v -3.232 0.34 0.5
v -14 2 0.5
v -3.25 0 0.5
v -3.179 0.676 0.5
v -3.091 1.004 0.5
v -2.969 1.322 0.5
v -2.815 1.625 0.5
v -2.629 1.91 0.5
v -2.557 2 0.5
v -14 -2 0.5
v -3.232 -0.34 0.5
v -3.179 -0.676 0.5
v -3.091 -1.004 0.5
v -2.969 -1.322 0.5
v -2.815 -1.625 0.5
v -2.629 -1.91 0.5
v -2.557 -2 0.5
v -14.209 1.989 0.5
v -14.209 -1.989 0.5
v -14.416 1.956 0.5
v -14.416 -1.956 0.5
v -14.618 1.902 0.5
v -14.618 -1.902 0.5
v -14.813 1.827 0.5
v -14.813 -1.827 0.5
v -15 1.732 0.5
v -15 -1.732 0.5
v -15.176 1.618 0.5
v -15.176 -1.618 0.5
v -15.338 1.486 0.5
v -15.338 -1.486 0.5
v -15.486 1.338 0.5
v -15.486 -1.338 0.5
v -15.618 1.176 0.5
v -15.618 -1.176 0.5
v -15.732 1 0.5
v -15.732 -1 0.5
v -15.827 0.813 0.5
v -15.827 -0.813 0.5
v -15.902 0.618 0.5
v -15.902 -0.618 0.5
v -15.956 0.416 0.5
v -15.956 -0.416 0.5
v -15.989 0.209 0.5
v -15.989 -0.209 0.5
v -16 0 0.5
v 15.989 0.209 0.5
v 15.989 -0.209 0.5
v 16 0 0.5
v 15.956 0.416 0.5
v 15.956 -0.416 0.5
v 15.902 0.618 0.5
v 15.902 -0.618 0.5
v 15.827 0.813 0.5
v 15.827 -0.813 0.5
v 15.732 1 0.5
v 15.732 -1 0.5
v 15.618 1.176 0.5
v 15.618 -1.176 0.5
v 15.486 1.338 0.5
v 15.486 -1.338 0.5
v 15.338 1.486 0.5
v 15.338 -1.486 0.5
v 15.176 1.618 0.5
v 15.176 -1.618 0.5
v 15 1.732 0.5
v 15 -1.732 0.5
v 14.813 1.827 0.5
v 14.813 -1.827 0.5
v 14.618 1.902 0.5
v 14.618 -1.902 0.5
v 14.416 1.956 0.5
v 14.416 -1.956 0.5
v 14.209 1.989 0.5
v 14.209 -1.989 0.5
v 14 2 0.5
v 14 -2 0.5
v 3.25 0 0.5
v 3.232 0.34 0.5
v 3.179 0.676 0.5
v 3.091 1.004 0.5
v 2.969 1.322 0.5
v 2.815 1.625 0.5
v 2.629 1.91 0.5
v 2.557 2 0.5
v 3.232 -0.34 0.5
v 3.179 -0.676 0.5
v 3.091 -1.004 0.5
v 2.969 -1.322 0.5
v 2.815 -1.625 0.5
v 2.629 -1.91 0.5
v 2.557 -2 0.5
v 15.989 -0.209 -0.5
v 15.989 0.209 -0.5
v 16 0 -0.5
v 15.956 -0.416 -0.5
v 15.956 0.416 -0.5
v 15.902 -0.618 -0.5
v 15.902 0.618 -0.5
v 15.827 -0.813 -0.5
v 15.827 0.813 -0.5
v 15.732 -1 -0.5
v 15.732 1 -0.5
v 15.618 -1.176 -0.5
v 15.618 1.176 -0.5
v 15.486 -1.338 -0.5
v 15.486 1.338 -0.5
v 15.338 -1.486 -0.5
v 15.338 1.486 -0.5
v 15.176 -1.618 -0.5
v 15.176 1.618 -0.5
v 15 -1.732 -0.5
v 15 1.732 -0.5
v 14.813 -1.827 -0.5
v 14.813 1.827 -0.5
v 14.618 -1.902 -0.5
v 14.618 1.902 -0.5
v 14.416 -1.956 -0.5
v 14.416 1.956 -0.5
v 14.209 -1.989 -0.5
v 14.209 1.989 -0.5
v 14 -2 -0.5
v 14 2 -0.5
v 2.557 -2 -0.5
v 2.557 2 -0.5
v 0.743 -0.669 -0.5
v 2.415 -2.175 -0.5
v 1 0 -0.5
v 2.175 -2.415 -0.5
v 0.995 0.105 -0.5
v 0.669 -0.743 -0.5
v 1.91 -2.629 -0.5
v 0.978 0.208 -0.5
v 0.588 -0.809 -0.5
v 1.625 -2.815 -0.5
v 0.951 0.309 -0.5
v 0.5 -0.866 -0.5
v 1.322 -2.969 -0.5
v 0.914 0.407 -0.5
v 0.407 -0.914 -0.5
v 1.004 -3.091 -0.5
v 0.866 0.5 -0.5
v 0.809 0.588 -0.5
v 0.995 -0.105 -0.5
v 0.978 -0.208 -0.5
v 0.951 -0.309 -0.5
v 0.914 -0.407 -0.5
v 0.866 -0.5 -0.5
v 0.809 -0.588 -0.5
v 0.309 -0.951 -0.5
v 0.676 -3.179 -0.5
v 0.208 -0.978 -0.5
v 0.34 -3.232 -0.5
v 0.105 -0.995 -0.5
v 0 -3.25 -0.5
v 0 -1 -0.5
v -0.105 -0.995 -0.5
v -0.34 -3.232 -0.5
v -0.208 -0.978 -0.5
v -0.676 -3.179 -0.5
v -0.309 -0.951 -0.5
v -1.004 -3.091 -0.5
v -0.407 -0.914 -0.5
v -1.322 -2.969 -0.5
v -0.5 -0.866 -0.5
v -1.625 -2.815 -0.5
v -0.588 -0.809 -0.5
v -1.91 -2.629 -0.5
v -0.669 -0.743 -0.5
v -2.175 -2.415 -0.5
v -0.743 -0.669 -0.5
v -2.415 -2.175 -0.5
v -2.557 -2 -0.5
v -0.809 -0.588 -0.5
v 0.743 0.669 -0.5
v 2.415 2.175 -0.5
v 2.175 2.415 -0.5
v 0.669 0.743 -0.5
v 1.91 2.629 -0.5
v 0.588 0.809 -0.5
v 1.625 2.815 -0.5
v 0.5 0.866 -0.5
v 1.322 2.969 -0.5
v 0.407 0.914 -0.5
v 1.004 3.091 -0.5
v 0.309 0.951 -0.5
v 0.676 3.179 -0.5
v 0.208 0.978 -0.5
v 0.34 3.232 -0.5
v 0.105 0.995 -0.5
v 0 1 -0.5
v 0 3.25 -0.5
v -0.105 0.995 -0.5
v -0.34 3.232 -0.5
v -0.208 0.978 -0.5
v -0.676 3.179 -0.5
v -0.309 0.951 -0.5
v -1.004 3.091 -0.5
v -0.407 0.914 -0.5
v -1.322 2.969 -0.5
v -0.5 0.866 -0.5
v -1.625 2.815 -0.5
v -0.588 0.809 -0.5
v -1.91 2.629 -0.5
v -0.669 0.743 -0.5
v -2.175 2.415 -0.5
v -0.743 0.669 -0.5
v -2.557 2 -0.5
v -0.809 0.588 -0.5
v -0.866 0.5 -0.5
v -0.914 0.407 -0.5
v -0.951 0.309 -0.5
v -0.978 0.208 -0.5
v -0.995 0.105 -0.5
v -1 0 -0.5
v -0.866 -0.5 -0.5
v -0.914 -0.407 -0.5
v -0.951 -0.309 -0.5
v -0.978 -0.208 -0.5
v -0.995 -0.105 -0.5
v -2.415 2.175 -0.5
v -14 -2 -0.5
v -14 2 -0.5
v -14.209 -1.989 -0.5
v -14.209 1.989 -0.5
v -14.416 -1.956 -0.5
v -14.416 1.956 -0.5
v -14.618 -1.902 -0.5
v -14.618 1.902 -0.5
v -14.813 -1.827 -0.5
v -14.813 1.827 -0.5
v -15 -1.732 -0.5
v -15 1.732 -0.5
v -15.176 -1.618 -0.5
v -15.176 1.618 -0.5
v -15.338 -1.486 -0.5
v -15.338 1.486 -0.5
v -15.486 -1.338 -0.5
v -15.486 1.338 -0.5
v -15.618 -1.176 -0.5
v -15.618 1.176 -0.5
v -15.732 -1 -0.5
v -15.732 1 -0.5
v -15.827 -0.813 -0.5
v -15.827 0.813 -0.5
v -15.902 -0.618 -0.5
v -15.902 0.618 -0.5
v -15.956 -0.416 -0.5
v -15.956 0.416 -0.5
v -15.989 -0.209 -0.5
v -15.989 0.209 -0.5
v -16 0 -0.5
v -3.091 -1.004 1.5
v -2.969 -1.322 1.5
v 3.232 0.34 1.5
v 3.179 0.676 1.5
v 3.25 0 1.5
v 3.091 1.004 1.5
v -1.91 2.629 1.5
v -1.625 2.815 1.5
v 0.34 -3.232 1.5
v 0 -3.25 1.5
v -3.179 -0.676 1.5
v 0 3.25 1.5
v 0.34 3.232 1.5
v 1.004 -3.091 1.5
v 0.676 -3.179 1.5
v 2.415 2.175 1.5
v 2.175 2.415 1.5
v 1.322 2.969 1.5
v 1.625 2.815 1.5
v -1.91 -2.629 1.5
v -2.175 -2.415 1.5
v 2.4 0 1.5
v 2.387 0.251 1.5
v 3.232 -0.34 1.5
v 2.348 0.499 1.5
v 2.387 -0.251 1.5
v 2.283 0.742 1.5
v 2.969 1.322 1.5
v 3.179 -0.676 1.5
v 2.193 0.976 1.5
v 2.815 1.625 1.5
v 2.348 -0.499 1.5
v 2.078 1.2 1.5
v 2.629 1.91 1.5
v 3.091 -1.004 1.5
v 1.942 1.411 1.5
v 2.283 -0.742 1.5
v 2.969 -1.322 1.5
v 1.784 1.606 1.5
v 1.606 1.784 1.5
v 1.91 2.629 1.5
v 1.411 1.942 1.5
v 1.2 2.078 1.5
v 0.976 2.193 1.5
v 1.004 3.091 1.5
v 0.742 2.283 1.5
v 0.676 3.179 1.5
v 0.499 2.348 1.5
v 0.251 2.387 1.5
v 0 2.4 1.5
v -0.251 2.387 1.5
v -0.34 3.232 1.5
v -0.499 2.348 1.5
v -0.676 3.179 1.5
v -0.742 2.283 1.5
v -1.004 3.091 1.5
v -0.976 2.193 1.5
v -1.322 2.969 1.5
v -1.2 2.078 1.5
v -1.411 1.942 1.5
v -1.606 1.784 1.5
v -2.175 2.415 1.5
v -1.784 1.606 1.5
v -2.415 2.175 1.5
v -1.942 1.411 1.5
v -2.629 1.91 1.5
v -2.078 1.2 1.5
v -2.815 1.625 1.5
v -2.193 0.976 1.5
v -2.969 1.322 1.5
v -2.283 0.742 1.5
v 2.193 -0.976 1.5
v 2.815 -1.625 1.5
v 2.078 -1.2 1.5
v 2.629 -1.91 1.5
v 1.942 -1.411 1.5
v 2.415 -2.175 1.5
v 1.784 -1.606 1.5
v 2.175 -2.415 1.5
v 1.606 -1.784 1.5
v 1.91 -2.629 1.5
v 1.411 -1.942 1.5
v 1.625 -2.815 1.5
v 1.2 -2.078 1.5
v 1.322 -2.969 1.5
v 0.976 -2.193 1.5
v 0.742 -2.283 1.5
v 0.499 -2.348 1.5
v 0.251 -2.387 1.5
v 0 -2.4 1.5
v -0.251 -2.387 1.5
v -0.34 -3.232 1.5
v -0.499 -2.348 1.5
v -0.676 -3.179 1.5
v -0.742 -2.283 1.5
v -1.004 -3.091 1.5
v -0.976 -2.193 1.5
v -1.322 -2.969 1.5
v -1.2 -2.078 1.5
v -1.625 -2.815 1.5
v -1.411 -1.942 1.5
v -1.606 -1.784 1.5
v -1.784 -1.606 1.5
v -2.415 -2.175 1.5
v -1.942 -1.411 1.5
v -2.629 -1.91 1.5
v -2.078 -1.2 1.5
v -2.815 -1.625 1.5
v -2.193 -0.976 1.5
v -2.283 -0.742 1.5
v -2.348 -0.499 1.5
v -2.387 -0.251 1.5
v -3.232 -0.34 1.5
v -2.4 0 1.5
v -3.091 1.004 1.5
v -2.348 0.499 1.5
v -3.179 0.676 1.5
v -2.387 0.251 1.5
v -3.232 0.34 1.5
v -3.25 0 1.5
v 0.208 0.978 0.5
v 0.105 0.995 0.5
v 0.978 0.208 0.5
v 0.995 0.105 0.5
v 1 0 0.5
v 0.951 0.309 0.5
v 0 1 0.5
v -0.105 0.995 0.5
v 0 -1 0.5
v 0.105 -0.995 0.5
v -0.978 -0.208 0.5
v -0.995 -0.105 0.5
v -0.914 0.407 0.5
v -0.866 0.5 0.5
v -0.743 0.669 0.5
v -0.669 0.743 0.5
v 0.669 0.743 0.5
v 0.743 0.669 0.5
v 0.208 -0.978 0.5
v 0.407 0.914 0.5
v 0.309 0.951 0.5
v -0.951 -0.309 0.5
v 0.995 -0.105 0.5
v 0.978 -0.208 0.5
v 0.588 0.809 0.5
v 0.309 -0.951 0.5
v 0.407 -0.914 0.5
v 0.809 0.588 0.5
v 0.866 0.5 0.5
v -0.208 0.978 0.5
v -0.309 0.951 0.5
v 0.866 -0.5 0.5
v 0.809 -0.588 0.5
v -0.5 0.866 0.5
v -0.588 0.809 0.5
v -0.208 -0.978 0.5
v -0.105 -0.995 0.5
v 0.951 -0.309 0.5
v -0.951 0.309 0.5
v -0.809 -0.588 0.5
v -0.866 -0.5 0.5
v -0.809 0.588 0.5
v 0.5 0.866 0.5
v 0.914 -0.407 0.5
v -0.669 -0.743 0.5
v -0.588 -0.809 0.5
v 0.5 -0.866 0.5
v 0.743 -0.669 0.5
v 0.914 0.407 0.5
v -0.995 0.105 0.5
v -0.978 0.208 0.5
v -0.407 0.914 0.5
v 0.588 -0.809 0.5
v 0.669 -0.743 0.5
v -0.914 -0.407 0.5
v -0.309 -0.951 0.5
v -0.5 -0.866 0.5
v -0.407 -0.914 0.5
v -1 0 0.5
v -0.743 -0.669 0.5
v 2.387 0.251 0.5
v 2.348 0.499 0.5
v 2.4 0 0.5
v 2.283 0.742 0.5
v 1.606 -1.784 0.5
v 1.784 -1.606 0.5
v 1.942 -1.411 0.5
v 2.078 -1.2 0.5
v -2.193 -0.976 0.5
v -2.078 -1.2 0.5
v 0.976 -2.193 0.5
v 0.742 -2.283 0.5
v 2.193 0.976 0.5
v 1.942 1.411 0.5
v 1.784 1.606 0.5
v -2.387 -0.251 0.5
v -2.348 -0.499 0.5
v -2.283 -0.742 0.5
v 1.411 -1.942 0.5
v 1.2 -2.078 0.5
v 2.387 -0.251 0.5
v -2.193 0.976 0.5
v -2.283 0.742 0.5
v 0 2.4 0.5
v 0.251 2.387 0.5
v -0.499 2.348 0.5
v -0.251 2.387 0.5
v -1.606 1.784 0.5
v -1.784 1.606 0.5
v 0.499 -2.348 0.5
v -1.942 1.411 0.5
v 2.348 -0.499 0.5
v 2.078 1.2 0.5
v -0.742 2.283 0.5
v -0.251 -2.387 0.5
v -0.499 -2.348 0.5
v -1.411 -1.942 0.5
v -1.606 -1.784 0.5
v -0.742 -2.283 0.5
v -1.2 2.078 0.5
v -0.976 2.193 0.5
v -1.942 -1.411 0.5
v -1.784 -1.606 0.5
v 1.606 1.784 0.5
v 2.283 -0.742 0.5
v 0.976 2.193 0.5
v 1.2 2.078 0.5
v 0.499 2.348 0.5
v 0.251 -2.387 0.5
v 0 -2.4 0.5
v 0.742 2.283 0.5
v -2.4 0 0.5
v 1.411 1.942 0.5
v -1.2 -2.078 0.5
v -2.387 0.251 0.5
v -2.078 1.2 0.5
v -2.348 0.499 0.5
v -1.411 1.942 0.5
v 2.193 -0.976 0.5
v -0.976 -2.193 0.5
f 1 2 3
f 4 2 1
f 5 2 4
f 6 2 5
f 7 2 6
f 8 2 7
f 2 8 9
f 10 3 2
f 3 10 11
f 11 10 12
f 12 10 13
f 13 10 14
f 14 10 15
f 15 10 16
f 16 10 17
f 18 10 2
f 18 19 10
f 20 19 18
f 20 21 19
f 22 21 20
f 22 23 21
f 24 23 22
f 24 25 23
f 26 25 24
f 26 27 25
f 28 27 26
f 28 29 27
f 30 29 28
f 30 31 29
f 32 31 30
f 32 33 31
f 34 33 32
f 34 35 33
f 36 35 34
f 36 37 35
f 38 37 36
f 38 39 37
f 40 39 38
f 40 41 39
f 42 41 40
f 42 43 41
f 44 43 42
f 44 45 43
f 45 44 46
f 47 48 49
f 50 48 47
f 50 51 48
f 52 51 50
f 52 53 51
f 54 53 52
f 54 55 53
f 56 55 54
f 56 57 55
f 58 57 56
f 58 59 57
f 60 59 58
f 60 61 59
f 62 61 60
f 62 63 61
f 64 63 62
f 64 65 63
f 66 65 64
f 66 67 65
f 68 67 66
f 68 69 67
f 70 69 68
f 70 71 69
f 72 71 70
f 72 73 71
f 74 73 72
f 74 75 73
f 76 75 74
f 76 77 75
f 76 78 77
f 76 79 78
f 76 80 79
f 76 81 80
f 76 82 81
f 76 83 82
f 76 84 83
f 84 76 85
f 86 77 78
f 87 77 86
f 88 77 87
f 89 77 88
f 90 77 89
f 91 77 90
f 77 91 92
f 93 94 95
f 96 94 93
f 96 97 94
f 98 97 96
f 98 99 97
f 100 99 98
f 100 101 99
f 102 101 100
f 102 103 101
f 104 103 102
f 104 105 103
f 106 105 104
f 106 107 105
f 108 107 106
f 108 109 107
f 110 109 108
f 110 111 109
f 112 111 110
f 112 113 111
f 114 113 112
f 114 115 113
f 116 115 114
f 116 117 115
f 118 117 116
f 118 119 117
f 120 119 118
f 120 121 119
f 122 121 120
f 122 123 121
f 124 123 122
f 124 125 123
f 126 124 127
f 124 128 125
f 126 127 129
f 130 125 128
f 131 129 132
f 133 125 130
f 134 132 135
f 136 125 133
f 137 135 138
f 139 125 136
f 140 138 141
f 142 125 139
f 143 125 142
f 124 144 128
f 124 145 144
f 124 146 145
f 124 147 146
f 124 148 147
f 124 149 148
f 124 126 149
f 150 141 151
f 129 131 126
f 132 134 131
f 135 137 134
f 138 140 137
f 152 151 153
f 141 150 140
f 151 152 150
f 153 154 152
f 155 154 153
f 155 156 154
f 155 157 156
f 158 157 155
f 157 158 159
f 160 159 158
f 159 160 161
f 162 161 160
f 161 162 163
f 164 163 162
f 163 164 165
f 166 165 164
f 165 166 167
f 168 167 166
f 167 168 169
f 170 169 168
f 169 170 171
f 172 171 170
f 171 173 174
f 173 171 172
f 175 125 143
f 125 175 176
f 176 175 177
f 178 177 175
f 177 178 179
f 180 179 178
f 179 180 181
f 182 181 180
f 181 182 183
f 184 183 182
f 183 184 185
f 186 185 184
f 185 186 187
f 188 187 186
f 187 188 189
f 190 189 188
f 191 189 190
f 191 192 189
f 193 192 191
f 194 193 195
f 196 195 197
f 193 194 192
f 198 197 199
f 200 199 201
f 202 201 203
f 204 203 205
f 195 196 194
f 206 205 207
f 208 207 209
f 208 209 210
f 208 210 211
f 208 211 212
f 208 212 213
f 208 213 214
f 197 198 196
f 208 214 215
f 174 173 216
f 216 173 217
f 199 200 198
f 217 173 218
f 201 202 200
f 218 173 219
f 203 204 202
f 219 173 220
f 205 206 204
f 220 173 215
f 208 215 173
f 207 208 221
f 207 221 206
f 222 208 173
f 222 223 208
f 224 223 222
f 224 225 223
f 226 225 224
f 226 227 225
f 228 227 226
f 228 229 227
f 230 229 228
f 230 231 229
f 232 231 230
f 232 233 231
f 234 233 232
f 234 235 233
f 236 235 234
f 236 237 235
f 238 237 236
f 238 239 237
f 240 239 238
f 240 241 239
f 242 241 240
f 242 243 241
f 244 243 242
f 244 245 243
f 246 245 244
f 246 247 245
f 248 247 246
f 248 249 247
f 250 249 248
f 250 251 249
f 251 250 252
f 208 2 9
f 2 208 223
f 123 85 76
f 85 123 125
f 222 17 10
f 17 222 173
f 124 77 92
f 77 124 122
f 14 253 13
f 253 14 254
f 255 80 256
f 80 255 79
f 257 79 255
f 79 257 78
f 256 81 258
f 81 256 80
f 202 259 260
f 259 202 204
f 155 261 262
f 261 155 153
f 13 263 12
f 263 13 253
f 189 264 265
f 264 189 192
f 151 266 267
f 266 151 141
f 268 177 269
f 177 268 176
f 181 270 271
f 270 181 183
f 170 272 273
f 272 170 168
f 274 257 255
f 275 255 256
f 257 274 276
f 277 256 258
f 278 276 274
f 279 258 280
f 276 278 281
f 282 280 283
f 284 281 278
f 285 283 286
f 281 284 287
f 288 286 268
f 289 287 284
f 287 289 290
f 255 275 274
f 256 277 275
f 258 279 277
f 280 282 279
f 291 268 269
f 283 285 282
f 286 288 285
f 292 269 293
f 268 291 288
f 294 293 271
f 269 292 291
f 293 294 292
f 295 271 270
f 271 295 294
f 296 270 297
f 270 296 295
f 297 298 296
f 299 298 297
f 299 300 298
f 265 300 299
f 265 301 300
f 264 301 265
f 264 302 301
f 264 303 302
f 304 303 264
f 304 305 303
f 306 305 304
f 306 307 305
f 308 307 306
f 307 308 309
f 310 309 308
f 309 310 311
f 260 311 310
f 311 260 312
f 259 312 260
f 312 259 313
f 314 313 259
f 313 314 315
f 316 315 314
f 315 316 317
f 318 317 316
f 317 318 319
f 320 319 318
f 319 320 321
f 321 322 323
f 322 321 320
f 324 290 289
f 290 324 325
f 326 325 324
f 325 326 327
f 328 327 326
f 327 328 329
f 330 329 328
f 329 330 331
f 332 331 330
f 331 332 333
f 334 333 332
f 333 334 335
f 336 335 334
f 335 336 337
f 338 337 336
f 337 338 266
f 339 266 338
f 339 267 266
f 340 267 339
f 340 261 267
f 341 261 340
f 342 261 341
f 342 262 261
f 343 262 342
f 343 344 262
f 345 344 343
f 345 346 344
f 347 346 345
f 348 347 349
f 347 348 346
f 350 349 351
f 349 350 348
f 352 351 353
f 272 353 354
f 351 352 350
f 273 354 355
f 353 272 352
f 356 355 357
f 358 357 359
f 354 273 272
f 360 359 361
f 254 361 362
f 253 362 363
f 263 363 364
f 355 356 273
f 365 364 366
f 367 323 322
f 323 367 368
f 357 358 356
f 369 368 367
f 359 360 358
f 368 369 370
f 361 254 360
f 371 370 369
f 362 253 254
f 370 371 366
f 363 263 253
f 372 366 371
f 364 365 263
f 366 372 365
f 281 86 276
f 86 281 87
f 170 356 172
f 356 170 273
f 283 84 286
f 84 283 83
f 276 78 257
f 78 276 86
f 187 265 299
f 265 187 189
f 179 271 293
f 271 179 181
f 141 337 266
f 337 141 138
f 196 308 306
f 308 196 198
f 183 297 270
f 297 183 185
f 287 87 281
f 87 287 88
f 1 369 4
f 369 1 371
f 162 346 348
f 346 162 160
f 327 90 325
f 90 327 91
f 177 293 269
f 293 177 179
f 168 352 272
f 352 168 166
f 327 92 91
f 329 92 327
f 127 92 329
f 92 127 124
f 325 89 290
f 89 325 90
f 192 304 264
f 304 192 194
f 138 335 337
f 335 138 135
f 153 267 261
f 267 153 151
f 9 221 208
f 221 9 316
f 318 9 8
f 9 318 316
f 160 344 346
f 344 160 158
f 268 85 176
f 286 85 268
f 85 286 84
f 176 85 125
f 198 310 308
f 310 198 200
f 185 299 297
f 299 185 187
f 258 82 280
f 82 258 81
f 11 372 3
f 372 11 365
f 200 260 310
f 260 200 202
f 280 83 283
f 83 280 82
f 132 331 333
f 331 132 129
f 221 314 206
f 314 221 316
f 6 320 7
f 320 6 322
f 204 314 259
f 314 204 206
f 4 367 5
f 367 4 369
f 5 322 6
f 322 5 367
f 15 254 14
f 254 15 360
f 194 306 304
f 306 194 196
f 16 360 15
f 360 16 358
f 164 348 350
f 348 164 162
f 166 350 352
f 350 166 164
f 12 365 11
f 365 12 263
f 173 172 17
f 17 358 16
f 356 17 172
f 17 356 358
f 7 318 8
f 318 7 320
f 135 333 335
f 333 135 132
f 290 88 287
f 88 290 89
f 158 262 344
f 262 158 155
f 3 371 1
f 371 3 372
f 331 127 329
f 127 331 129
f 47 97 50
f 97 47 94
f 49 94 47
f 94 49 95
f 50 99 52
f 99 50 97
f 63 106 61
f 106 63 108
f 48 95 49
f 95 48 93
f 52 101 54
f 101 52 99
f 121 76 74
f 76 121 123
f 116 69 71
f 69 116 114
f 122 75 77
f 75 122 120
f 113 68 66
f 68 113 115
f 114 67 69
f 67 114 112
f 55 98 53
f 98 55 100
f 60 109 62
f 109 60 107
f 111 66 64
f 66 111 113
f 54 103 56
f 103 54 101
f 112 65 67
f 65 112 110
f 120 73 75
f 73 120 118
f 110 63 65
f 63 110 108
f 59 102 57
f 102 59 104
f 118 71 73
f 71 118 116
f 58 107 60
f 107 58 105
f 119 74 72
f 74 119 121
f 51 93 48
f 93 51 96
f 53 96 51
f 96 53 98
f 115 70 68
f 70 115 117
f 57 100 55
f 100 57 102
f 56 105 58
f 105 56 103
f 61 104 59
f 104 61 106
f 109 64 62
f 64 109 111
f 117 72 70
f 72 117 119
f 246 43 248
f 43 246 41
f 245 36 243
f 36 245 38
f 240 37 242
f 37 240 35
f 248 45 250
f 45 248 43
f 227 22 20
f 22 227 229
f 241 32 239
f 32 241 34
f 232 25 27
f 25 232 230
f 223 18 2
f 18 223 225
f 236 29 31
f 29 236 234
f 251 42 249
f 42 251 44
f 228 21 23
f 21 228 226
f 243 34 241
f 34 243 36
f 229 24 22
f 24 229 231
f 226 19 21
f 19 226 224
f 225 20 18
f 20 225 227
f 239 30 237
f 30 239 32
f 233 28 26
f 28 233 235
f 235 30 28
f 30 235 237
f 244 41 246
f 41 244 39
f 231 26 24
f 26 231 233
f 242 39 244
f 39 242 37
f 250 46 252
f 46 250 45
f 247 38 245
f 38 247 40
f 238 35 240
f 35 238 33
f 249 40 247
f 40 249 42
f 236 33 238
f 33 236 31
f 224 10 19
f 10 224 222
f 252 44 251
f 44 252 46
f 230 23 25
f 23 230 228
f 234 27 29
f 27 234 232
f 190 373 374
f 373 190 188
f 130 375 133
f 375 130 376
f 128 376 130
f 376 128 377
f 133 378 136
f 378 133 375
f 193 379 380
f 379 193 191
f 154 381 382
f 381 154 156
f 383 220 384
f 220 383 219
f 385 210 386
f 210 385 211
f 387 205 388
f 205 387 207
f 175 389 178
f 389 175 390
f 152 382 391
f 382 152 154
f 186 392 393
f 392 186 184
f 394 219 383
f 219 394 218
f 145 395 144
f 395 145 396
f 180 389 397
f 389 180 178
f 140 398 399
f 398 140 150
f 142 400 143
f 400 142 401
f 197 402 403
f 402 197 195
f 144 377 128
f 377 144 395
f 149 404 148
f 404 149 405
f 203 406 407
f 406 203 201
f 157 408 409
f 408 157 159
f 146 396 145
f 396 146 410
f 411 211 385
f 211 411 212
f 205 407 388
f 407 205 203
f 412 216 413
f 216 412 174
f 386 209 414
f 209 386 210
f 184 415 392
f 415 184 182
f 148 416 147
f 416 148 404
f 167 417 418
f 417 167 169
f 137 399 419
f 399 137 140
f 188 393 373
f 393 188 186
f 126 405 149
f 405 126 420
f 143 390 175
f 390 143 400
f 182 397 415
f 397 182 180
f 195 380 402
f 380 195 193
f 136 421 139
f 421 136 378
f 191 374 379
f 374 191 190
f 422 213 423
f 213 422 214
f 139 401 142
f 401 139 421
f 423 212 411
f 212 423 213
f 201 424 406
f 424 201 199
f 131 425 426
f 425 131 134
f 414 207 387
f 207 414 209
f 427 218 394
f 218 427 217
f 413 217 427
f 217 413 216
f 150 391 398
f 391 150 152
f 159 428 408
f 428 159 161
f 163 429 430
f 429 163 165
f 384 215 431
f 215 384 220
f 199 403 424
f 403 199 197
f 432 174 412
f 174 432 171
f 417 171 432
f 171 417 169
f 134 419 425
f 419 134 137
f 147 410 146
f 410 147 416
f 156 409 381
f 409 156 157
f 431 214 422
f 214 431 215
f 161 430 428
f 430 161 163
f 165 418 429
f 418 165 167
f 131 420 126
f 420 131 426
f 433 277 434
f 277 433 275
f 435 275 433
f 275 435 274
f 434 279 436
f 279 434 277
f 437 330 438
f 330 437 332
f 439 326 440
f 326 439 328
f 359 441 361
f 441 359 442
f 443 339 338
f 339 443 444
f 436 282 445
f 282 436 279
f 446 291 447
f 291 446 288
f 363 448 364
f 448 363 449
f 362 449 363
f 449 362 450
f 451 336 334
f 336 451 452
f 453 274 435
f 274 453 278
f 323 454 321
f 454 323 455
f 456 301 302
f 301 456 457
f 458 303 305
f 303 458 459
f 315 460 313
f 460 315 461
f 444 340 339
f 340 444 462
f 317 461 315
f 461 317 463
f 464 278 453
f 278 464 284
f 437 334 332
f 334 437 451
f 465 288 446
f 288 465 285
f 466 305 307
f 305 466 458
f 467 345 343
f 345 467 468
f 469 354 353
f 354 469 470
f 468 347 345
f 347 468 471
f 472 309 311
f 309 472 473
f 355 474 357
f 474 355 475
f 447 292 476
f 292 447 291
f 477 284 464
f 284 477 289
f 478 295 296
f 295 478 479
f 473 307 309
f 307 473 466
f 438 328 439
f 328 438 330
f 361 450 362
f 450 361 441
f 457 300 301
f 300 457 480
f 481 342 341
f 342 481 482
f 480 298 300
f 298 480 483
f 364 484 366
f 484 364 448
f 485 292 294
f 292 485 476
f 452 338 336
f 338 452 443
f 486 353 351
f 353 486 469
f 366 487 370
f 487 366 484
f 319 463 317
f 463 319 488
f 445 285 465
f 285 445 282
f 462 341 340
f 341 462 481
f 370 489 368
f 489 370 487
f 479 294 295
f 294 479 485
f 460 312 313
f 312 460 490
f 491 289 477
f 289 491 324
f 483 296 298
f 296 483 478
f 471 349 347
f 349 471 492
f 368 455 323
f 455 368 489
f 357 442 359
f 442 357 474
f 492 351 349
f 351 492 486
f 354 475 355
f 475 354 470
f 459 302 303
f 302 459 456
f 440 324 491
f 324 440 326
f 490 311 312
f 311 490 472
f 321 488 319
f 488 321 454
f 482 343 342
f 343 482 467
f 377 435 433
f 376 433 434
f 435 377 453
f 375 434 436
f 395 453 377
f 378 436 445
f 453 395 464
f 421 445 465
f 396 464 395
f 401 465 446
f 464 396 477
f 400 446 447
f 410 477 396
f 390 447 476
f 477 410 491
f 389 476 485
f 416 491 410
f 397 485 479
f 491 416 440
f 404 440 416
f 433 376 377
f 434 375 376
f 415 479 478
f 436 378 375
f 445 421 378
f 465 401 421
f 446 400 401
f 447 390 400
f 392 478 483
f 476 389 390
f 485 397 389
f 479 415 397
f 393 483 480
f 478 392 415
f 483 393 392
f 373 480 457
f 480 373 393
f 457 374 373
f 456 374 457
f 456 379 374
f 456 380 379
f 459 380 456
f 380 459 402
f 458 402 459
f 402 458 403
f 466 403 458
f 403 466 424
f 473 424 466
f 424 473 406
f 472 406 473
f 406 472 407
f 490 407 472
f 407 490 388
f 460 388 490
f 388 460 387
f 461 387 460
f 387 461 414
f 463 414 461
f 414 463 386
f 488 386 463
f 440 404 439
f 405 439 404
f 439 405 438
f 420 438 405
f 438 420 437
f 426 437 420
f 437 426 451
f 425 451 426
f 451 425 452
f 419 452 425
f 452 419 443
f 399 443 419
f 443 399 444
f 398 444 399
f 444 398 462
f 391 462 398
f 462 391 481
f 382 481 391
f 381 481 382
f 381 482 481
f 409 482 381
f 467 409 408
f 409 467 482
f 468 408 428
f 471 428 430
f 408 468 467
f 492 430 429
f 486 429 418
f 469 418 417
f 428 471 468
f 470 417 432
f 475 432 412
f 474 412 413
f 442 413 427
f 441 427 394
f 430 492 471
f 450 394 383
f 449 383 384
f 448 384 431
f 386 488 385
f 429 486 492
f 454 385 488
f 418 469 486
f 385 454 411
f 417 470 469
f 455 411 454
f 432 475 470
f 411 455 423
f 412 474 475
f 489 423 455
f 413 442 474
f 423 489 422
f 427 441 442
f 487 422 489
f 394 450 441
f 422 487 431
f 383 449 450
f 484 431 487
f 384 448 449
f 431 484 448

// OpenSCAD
$fn=60;

difference() {
union() {
cube([28,4,1], center= true);
translate([0,0,0.5])
cylinder(d=6.5,h=2,center=true);
translate([14,0,0])
    cylinder(d=4,h=1,center=true);
translate([-14,0,0])
    cylinder(d=4,h=1,center=true);
}
cylinder(d=2, h=4, center=true);
translate([0,0,1])
cylinder(d=4.8, h=1, center=true);
}
